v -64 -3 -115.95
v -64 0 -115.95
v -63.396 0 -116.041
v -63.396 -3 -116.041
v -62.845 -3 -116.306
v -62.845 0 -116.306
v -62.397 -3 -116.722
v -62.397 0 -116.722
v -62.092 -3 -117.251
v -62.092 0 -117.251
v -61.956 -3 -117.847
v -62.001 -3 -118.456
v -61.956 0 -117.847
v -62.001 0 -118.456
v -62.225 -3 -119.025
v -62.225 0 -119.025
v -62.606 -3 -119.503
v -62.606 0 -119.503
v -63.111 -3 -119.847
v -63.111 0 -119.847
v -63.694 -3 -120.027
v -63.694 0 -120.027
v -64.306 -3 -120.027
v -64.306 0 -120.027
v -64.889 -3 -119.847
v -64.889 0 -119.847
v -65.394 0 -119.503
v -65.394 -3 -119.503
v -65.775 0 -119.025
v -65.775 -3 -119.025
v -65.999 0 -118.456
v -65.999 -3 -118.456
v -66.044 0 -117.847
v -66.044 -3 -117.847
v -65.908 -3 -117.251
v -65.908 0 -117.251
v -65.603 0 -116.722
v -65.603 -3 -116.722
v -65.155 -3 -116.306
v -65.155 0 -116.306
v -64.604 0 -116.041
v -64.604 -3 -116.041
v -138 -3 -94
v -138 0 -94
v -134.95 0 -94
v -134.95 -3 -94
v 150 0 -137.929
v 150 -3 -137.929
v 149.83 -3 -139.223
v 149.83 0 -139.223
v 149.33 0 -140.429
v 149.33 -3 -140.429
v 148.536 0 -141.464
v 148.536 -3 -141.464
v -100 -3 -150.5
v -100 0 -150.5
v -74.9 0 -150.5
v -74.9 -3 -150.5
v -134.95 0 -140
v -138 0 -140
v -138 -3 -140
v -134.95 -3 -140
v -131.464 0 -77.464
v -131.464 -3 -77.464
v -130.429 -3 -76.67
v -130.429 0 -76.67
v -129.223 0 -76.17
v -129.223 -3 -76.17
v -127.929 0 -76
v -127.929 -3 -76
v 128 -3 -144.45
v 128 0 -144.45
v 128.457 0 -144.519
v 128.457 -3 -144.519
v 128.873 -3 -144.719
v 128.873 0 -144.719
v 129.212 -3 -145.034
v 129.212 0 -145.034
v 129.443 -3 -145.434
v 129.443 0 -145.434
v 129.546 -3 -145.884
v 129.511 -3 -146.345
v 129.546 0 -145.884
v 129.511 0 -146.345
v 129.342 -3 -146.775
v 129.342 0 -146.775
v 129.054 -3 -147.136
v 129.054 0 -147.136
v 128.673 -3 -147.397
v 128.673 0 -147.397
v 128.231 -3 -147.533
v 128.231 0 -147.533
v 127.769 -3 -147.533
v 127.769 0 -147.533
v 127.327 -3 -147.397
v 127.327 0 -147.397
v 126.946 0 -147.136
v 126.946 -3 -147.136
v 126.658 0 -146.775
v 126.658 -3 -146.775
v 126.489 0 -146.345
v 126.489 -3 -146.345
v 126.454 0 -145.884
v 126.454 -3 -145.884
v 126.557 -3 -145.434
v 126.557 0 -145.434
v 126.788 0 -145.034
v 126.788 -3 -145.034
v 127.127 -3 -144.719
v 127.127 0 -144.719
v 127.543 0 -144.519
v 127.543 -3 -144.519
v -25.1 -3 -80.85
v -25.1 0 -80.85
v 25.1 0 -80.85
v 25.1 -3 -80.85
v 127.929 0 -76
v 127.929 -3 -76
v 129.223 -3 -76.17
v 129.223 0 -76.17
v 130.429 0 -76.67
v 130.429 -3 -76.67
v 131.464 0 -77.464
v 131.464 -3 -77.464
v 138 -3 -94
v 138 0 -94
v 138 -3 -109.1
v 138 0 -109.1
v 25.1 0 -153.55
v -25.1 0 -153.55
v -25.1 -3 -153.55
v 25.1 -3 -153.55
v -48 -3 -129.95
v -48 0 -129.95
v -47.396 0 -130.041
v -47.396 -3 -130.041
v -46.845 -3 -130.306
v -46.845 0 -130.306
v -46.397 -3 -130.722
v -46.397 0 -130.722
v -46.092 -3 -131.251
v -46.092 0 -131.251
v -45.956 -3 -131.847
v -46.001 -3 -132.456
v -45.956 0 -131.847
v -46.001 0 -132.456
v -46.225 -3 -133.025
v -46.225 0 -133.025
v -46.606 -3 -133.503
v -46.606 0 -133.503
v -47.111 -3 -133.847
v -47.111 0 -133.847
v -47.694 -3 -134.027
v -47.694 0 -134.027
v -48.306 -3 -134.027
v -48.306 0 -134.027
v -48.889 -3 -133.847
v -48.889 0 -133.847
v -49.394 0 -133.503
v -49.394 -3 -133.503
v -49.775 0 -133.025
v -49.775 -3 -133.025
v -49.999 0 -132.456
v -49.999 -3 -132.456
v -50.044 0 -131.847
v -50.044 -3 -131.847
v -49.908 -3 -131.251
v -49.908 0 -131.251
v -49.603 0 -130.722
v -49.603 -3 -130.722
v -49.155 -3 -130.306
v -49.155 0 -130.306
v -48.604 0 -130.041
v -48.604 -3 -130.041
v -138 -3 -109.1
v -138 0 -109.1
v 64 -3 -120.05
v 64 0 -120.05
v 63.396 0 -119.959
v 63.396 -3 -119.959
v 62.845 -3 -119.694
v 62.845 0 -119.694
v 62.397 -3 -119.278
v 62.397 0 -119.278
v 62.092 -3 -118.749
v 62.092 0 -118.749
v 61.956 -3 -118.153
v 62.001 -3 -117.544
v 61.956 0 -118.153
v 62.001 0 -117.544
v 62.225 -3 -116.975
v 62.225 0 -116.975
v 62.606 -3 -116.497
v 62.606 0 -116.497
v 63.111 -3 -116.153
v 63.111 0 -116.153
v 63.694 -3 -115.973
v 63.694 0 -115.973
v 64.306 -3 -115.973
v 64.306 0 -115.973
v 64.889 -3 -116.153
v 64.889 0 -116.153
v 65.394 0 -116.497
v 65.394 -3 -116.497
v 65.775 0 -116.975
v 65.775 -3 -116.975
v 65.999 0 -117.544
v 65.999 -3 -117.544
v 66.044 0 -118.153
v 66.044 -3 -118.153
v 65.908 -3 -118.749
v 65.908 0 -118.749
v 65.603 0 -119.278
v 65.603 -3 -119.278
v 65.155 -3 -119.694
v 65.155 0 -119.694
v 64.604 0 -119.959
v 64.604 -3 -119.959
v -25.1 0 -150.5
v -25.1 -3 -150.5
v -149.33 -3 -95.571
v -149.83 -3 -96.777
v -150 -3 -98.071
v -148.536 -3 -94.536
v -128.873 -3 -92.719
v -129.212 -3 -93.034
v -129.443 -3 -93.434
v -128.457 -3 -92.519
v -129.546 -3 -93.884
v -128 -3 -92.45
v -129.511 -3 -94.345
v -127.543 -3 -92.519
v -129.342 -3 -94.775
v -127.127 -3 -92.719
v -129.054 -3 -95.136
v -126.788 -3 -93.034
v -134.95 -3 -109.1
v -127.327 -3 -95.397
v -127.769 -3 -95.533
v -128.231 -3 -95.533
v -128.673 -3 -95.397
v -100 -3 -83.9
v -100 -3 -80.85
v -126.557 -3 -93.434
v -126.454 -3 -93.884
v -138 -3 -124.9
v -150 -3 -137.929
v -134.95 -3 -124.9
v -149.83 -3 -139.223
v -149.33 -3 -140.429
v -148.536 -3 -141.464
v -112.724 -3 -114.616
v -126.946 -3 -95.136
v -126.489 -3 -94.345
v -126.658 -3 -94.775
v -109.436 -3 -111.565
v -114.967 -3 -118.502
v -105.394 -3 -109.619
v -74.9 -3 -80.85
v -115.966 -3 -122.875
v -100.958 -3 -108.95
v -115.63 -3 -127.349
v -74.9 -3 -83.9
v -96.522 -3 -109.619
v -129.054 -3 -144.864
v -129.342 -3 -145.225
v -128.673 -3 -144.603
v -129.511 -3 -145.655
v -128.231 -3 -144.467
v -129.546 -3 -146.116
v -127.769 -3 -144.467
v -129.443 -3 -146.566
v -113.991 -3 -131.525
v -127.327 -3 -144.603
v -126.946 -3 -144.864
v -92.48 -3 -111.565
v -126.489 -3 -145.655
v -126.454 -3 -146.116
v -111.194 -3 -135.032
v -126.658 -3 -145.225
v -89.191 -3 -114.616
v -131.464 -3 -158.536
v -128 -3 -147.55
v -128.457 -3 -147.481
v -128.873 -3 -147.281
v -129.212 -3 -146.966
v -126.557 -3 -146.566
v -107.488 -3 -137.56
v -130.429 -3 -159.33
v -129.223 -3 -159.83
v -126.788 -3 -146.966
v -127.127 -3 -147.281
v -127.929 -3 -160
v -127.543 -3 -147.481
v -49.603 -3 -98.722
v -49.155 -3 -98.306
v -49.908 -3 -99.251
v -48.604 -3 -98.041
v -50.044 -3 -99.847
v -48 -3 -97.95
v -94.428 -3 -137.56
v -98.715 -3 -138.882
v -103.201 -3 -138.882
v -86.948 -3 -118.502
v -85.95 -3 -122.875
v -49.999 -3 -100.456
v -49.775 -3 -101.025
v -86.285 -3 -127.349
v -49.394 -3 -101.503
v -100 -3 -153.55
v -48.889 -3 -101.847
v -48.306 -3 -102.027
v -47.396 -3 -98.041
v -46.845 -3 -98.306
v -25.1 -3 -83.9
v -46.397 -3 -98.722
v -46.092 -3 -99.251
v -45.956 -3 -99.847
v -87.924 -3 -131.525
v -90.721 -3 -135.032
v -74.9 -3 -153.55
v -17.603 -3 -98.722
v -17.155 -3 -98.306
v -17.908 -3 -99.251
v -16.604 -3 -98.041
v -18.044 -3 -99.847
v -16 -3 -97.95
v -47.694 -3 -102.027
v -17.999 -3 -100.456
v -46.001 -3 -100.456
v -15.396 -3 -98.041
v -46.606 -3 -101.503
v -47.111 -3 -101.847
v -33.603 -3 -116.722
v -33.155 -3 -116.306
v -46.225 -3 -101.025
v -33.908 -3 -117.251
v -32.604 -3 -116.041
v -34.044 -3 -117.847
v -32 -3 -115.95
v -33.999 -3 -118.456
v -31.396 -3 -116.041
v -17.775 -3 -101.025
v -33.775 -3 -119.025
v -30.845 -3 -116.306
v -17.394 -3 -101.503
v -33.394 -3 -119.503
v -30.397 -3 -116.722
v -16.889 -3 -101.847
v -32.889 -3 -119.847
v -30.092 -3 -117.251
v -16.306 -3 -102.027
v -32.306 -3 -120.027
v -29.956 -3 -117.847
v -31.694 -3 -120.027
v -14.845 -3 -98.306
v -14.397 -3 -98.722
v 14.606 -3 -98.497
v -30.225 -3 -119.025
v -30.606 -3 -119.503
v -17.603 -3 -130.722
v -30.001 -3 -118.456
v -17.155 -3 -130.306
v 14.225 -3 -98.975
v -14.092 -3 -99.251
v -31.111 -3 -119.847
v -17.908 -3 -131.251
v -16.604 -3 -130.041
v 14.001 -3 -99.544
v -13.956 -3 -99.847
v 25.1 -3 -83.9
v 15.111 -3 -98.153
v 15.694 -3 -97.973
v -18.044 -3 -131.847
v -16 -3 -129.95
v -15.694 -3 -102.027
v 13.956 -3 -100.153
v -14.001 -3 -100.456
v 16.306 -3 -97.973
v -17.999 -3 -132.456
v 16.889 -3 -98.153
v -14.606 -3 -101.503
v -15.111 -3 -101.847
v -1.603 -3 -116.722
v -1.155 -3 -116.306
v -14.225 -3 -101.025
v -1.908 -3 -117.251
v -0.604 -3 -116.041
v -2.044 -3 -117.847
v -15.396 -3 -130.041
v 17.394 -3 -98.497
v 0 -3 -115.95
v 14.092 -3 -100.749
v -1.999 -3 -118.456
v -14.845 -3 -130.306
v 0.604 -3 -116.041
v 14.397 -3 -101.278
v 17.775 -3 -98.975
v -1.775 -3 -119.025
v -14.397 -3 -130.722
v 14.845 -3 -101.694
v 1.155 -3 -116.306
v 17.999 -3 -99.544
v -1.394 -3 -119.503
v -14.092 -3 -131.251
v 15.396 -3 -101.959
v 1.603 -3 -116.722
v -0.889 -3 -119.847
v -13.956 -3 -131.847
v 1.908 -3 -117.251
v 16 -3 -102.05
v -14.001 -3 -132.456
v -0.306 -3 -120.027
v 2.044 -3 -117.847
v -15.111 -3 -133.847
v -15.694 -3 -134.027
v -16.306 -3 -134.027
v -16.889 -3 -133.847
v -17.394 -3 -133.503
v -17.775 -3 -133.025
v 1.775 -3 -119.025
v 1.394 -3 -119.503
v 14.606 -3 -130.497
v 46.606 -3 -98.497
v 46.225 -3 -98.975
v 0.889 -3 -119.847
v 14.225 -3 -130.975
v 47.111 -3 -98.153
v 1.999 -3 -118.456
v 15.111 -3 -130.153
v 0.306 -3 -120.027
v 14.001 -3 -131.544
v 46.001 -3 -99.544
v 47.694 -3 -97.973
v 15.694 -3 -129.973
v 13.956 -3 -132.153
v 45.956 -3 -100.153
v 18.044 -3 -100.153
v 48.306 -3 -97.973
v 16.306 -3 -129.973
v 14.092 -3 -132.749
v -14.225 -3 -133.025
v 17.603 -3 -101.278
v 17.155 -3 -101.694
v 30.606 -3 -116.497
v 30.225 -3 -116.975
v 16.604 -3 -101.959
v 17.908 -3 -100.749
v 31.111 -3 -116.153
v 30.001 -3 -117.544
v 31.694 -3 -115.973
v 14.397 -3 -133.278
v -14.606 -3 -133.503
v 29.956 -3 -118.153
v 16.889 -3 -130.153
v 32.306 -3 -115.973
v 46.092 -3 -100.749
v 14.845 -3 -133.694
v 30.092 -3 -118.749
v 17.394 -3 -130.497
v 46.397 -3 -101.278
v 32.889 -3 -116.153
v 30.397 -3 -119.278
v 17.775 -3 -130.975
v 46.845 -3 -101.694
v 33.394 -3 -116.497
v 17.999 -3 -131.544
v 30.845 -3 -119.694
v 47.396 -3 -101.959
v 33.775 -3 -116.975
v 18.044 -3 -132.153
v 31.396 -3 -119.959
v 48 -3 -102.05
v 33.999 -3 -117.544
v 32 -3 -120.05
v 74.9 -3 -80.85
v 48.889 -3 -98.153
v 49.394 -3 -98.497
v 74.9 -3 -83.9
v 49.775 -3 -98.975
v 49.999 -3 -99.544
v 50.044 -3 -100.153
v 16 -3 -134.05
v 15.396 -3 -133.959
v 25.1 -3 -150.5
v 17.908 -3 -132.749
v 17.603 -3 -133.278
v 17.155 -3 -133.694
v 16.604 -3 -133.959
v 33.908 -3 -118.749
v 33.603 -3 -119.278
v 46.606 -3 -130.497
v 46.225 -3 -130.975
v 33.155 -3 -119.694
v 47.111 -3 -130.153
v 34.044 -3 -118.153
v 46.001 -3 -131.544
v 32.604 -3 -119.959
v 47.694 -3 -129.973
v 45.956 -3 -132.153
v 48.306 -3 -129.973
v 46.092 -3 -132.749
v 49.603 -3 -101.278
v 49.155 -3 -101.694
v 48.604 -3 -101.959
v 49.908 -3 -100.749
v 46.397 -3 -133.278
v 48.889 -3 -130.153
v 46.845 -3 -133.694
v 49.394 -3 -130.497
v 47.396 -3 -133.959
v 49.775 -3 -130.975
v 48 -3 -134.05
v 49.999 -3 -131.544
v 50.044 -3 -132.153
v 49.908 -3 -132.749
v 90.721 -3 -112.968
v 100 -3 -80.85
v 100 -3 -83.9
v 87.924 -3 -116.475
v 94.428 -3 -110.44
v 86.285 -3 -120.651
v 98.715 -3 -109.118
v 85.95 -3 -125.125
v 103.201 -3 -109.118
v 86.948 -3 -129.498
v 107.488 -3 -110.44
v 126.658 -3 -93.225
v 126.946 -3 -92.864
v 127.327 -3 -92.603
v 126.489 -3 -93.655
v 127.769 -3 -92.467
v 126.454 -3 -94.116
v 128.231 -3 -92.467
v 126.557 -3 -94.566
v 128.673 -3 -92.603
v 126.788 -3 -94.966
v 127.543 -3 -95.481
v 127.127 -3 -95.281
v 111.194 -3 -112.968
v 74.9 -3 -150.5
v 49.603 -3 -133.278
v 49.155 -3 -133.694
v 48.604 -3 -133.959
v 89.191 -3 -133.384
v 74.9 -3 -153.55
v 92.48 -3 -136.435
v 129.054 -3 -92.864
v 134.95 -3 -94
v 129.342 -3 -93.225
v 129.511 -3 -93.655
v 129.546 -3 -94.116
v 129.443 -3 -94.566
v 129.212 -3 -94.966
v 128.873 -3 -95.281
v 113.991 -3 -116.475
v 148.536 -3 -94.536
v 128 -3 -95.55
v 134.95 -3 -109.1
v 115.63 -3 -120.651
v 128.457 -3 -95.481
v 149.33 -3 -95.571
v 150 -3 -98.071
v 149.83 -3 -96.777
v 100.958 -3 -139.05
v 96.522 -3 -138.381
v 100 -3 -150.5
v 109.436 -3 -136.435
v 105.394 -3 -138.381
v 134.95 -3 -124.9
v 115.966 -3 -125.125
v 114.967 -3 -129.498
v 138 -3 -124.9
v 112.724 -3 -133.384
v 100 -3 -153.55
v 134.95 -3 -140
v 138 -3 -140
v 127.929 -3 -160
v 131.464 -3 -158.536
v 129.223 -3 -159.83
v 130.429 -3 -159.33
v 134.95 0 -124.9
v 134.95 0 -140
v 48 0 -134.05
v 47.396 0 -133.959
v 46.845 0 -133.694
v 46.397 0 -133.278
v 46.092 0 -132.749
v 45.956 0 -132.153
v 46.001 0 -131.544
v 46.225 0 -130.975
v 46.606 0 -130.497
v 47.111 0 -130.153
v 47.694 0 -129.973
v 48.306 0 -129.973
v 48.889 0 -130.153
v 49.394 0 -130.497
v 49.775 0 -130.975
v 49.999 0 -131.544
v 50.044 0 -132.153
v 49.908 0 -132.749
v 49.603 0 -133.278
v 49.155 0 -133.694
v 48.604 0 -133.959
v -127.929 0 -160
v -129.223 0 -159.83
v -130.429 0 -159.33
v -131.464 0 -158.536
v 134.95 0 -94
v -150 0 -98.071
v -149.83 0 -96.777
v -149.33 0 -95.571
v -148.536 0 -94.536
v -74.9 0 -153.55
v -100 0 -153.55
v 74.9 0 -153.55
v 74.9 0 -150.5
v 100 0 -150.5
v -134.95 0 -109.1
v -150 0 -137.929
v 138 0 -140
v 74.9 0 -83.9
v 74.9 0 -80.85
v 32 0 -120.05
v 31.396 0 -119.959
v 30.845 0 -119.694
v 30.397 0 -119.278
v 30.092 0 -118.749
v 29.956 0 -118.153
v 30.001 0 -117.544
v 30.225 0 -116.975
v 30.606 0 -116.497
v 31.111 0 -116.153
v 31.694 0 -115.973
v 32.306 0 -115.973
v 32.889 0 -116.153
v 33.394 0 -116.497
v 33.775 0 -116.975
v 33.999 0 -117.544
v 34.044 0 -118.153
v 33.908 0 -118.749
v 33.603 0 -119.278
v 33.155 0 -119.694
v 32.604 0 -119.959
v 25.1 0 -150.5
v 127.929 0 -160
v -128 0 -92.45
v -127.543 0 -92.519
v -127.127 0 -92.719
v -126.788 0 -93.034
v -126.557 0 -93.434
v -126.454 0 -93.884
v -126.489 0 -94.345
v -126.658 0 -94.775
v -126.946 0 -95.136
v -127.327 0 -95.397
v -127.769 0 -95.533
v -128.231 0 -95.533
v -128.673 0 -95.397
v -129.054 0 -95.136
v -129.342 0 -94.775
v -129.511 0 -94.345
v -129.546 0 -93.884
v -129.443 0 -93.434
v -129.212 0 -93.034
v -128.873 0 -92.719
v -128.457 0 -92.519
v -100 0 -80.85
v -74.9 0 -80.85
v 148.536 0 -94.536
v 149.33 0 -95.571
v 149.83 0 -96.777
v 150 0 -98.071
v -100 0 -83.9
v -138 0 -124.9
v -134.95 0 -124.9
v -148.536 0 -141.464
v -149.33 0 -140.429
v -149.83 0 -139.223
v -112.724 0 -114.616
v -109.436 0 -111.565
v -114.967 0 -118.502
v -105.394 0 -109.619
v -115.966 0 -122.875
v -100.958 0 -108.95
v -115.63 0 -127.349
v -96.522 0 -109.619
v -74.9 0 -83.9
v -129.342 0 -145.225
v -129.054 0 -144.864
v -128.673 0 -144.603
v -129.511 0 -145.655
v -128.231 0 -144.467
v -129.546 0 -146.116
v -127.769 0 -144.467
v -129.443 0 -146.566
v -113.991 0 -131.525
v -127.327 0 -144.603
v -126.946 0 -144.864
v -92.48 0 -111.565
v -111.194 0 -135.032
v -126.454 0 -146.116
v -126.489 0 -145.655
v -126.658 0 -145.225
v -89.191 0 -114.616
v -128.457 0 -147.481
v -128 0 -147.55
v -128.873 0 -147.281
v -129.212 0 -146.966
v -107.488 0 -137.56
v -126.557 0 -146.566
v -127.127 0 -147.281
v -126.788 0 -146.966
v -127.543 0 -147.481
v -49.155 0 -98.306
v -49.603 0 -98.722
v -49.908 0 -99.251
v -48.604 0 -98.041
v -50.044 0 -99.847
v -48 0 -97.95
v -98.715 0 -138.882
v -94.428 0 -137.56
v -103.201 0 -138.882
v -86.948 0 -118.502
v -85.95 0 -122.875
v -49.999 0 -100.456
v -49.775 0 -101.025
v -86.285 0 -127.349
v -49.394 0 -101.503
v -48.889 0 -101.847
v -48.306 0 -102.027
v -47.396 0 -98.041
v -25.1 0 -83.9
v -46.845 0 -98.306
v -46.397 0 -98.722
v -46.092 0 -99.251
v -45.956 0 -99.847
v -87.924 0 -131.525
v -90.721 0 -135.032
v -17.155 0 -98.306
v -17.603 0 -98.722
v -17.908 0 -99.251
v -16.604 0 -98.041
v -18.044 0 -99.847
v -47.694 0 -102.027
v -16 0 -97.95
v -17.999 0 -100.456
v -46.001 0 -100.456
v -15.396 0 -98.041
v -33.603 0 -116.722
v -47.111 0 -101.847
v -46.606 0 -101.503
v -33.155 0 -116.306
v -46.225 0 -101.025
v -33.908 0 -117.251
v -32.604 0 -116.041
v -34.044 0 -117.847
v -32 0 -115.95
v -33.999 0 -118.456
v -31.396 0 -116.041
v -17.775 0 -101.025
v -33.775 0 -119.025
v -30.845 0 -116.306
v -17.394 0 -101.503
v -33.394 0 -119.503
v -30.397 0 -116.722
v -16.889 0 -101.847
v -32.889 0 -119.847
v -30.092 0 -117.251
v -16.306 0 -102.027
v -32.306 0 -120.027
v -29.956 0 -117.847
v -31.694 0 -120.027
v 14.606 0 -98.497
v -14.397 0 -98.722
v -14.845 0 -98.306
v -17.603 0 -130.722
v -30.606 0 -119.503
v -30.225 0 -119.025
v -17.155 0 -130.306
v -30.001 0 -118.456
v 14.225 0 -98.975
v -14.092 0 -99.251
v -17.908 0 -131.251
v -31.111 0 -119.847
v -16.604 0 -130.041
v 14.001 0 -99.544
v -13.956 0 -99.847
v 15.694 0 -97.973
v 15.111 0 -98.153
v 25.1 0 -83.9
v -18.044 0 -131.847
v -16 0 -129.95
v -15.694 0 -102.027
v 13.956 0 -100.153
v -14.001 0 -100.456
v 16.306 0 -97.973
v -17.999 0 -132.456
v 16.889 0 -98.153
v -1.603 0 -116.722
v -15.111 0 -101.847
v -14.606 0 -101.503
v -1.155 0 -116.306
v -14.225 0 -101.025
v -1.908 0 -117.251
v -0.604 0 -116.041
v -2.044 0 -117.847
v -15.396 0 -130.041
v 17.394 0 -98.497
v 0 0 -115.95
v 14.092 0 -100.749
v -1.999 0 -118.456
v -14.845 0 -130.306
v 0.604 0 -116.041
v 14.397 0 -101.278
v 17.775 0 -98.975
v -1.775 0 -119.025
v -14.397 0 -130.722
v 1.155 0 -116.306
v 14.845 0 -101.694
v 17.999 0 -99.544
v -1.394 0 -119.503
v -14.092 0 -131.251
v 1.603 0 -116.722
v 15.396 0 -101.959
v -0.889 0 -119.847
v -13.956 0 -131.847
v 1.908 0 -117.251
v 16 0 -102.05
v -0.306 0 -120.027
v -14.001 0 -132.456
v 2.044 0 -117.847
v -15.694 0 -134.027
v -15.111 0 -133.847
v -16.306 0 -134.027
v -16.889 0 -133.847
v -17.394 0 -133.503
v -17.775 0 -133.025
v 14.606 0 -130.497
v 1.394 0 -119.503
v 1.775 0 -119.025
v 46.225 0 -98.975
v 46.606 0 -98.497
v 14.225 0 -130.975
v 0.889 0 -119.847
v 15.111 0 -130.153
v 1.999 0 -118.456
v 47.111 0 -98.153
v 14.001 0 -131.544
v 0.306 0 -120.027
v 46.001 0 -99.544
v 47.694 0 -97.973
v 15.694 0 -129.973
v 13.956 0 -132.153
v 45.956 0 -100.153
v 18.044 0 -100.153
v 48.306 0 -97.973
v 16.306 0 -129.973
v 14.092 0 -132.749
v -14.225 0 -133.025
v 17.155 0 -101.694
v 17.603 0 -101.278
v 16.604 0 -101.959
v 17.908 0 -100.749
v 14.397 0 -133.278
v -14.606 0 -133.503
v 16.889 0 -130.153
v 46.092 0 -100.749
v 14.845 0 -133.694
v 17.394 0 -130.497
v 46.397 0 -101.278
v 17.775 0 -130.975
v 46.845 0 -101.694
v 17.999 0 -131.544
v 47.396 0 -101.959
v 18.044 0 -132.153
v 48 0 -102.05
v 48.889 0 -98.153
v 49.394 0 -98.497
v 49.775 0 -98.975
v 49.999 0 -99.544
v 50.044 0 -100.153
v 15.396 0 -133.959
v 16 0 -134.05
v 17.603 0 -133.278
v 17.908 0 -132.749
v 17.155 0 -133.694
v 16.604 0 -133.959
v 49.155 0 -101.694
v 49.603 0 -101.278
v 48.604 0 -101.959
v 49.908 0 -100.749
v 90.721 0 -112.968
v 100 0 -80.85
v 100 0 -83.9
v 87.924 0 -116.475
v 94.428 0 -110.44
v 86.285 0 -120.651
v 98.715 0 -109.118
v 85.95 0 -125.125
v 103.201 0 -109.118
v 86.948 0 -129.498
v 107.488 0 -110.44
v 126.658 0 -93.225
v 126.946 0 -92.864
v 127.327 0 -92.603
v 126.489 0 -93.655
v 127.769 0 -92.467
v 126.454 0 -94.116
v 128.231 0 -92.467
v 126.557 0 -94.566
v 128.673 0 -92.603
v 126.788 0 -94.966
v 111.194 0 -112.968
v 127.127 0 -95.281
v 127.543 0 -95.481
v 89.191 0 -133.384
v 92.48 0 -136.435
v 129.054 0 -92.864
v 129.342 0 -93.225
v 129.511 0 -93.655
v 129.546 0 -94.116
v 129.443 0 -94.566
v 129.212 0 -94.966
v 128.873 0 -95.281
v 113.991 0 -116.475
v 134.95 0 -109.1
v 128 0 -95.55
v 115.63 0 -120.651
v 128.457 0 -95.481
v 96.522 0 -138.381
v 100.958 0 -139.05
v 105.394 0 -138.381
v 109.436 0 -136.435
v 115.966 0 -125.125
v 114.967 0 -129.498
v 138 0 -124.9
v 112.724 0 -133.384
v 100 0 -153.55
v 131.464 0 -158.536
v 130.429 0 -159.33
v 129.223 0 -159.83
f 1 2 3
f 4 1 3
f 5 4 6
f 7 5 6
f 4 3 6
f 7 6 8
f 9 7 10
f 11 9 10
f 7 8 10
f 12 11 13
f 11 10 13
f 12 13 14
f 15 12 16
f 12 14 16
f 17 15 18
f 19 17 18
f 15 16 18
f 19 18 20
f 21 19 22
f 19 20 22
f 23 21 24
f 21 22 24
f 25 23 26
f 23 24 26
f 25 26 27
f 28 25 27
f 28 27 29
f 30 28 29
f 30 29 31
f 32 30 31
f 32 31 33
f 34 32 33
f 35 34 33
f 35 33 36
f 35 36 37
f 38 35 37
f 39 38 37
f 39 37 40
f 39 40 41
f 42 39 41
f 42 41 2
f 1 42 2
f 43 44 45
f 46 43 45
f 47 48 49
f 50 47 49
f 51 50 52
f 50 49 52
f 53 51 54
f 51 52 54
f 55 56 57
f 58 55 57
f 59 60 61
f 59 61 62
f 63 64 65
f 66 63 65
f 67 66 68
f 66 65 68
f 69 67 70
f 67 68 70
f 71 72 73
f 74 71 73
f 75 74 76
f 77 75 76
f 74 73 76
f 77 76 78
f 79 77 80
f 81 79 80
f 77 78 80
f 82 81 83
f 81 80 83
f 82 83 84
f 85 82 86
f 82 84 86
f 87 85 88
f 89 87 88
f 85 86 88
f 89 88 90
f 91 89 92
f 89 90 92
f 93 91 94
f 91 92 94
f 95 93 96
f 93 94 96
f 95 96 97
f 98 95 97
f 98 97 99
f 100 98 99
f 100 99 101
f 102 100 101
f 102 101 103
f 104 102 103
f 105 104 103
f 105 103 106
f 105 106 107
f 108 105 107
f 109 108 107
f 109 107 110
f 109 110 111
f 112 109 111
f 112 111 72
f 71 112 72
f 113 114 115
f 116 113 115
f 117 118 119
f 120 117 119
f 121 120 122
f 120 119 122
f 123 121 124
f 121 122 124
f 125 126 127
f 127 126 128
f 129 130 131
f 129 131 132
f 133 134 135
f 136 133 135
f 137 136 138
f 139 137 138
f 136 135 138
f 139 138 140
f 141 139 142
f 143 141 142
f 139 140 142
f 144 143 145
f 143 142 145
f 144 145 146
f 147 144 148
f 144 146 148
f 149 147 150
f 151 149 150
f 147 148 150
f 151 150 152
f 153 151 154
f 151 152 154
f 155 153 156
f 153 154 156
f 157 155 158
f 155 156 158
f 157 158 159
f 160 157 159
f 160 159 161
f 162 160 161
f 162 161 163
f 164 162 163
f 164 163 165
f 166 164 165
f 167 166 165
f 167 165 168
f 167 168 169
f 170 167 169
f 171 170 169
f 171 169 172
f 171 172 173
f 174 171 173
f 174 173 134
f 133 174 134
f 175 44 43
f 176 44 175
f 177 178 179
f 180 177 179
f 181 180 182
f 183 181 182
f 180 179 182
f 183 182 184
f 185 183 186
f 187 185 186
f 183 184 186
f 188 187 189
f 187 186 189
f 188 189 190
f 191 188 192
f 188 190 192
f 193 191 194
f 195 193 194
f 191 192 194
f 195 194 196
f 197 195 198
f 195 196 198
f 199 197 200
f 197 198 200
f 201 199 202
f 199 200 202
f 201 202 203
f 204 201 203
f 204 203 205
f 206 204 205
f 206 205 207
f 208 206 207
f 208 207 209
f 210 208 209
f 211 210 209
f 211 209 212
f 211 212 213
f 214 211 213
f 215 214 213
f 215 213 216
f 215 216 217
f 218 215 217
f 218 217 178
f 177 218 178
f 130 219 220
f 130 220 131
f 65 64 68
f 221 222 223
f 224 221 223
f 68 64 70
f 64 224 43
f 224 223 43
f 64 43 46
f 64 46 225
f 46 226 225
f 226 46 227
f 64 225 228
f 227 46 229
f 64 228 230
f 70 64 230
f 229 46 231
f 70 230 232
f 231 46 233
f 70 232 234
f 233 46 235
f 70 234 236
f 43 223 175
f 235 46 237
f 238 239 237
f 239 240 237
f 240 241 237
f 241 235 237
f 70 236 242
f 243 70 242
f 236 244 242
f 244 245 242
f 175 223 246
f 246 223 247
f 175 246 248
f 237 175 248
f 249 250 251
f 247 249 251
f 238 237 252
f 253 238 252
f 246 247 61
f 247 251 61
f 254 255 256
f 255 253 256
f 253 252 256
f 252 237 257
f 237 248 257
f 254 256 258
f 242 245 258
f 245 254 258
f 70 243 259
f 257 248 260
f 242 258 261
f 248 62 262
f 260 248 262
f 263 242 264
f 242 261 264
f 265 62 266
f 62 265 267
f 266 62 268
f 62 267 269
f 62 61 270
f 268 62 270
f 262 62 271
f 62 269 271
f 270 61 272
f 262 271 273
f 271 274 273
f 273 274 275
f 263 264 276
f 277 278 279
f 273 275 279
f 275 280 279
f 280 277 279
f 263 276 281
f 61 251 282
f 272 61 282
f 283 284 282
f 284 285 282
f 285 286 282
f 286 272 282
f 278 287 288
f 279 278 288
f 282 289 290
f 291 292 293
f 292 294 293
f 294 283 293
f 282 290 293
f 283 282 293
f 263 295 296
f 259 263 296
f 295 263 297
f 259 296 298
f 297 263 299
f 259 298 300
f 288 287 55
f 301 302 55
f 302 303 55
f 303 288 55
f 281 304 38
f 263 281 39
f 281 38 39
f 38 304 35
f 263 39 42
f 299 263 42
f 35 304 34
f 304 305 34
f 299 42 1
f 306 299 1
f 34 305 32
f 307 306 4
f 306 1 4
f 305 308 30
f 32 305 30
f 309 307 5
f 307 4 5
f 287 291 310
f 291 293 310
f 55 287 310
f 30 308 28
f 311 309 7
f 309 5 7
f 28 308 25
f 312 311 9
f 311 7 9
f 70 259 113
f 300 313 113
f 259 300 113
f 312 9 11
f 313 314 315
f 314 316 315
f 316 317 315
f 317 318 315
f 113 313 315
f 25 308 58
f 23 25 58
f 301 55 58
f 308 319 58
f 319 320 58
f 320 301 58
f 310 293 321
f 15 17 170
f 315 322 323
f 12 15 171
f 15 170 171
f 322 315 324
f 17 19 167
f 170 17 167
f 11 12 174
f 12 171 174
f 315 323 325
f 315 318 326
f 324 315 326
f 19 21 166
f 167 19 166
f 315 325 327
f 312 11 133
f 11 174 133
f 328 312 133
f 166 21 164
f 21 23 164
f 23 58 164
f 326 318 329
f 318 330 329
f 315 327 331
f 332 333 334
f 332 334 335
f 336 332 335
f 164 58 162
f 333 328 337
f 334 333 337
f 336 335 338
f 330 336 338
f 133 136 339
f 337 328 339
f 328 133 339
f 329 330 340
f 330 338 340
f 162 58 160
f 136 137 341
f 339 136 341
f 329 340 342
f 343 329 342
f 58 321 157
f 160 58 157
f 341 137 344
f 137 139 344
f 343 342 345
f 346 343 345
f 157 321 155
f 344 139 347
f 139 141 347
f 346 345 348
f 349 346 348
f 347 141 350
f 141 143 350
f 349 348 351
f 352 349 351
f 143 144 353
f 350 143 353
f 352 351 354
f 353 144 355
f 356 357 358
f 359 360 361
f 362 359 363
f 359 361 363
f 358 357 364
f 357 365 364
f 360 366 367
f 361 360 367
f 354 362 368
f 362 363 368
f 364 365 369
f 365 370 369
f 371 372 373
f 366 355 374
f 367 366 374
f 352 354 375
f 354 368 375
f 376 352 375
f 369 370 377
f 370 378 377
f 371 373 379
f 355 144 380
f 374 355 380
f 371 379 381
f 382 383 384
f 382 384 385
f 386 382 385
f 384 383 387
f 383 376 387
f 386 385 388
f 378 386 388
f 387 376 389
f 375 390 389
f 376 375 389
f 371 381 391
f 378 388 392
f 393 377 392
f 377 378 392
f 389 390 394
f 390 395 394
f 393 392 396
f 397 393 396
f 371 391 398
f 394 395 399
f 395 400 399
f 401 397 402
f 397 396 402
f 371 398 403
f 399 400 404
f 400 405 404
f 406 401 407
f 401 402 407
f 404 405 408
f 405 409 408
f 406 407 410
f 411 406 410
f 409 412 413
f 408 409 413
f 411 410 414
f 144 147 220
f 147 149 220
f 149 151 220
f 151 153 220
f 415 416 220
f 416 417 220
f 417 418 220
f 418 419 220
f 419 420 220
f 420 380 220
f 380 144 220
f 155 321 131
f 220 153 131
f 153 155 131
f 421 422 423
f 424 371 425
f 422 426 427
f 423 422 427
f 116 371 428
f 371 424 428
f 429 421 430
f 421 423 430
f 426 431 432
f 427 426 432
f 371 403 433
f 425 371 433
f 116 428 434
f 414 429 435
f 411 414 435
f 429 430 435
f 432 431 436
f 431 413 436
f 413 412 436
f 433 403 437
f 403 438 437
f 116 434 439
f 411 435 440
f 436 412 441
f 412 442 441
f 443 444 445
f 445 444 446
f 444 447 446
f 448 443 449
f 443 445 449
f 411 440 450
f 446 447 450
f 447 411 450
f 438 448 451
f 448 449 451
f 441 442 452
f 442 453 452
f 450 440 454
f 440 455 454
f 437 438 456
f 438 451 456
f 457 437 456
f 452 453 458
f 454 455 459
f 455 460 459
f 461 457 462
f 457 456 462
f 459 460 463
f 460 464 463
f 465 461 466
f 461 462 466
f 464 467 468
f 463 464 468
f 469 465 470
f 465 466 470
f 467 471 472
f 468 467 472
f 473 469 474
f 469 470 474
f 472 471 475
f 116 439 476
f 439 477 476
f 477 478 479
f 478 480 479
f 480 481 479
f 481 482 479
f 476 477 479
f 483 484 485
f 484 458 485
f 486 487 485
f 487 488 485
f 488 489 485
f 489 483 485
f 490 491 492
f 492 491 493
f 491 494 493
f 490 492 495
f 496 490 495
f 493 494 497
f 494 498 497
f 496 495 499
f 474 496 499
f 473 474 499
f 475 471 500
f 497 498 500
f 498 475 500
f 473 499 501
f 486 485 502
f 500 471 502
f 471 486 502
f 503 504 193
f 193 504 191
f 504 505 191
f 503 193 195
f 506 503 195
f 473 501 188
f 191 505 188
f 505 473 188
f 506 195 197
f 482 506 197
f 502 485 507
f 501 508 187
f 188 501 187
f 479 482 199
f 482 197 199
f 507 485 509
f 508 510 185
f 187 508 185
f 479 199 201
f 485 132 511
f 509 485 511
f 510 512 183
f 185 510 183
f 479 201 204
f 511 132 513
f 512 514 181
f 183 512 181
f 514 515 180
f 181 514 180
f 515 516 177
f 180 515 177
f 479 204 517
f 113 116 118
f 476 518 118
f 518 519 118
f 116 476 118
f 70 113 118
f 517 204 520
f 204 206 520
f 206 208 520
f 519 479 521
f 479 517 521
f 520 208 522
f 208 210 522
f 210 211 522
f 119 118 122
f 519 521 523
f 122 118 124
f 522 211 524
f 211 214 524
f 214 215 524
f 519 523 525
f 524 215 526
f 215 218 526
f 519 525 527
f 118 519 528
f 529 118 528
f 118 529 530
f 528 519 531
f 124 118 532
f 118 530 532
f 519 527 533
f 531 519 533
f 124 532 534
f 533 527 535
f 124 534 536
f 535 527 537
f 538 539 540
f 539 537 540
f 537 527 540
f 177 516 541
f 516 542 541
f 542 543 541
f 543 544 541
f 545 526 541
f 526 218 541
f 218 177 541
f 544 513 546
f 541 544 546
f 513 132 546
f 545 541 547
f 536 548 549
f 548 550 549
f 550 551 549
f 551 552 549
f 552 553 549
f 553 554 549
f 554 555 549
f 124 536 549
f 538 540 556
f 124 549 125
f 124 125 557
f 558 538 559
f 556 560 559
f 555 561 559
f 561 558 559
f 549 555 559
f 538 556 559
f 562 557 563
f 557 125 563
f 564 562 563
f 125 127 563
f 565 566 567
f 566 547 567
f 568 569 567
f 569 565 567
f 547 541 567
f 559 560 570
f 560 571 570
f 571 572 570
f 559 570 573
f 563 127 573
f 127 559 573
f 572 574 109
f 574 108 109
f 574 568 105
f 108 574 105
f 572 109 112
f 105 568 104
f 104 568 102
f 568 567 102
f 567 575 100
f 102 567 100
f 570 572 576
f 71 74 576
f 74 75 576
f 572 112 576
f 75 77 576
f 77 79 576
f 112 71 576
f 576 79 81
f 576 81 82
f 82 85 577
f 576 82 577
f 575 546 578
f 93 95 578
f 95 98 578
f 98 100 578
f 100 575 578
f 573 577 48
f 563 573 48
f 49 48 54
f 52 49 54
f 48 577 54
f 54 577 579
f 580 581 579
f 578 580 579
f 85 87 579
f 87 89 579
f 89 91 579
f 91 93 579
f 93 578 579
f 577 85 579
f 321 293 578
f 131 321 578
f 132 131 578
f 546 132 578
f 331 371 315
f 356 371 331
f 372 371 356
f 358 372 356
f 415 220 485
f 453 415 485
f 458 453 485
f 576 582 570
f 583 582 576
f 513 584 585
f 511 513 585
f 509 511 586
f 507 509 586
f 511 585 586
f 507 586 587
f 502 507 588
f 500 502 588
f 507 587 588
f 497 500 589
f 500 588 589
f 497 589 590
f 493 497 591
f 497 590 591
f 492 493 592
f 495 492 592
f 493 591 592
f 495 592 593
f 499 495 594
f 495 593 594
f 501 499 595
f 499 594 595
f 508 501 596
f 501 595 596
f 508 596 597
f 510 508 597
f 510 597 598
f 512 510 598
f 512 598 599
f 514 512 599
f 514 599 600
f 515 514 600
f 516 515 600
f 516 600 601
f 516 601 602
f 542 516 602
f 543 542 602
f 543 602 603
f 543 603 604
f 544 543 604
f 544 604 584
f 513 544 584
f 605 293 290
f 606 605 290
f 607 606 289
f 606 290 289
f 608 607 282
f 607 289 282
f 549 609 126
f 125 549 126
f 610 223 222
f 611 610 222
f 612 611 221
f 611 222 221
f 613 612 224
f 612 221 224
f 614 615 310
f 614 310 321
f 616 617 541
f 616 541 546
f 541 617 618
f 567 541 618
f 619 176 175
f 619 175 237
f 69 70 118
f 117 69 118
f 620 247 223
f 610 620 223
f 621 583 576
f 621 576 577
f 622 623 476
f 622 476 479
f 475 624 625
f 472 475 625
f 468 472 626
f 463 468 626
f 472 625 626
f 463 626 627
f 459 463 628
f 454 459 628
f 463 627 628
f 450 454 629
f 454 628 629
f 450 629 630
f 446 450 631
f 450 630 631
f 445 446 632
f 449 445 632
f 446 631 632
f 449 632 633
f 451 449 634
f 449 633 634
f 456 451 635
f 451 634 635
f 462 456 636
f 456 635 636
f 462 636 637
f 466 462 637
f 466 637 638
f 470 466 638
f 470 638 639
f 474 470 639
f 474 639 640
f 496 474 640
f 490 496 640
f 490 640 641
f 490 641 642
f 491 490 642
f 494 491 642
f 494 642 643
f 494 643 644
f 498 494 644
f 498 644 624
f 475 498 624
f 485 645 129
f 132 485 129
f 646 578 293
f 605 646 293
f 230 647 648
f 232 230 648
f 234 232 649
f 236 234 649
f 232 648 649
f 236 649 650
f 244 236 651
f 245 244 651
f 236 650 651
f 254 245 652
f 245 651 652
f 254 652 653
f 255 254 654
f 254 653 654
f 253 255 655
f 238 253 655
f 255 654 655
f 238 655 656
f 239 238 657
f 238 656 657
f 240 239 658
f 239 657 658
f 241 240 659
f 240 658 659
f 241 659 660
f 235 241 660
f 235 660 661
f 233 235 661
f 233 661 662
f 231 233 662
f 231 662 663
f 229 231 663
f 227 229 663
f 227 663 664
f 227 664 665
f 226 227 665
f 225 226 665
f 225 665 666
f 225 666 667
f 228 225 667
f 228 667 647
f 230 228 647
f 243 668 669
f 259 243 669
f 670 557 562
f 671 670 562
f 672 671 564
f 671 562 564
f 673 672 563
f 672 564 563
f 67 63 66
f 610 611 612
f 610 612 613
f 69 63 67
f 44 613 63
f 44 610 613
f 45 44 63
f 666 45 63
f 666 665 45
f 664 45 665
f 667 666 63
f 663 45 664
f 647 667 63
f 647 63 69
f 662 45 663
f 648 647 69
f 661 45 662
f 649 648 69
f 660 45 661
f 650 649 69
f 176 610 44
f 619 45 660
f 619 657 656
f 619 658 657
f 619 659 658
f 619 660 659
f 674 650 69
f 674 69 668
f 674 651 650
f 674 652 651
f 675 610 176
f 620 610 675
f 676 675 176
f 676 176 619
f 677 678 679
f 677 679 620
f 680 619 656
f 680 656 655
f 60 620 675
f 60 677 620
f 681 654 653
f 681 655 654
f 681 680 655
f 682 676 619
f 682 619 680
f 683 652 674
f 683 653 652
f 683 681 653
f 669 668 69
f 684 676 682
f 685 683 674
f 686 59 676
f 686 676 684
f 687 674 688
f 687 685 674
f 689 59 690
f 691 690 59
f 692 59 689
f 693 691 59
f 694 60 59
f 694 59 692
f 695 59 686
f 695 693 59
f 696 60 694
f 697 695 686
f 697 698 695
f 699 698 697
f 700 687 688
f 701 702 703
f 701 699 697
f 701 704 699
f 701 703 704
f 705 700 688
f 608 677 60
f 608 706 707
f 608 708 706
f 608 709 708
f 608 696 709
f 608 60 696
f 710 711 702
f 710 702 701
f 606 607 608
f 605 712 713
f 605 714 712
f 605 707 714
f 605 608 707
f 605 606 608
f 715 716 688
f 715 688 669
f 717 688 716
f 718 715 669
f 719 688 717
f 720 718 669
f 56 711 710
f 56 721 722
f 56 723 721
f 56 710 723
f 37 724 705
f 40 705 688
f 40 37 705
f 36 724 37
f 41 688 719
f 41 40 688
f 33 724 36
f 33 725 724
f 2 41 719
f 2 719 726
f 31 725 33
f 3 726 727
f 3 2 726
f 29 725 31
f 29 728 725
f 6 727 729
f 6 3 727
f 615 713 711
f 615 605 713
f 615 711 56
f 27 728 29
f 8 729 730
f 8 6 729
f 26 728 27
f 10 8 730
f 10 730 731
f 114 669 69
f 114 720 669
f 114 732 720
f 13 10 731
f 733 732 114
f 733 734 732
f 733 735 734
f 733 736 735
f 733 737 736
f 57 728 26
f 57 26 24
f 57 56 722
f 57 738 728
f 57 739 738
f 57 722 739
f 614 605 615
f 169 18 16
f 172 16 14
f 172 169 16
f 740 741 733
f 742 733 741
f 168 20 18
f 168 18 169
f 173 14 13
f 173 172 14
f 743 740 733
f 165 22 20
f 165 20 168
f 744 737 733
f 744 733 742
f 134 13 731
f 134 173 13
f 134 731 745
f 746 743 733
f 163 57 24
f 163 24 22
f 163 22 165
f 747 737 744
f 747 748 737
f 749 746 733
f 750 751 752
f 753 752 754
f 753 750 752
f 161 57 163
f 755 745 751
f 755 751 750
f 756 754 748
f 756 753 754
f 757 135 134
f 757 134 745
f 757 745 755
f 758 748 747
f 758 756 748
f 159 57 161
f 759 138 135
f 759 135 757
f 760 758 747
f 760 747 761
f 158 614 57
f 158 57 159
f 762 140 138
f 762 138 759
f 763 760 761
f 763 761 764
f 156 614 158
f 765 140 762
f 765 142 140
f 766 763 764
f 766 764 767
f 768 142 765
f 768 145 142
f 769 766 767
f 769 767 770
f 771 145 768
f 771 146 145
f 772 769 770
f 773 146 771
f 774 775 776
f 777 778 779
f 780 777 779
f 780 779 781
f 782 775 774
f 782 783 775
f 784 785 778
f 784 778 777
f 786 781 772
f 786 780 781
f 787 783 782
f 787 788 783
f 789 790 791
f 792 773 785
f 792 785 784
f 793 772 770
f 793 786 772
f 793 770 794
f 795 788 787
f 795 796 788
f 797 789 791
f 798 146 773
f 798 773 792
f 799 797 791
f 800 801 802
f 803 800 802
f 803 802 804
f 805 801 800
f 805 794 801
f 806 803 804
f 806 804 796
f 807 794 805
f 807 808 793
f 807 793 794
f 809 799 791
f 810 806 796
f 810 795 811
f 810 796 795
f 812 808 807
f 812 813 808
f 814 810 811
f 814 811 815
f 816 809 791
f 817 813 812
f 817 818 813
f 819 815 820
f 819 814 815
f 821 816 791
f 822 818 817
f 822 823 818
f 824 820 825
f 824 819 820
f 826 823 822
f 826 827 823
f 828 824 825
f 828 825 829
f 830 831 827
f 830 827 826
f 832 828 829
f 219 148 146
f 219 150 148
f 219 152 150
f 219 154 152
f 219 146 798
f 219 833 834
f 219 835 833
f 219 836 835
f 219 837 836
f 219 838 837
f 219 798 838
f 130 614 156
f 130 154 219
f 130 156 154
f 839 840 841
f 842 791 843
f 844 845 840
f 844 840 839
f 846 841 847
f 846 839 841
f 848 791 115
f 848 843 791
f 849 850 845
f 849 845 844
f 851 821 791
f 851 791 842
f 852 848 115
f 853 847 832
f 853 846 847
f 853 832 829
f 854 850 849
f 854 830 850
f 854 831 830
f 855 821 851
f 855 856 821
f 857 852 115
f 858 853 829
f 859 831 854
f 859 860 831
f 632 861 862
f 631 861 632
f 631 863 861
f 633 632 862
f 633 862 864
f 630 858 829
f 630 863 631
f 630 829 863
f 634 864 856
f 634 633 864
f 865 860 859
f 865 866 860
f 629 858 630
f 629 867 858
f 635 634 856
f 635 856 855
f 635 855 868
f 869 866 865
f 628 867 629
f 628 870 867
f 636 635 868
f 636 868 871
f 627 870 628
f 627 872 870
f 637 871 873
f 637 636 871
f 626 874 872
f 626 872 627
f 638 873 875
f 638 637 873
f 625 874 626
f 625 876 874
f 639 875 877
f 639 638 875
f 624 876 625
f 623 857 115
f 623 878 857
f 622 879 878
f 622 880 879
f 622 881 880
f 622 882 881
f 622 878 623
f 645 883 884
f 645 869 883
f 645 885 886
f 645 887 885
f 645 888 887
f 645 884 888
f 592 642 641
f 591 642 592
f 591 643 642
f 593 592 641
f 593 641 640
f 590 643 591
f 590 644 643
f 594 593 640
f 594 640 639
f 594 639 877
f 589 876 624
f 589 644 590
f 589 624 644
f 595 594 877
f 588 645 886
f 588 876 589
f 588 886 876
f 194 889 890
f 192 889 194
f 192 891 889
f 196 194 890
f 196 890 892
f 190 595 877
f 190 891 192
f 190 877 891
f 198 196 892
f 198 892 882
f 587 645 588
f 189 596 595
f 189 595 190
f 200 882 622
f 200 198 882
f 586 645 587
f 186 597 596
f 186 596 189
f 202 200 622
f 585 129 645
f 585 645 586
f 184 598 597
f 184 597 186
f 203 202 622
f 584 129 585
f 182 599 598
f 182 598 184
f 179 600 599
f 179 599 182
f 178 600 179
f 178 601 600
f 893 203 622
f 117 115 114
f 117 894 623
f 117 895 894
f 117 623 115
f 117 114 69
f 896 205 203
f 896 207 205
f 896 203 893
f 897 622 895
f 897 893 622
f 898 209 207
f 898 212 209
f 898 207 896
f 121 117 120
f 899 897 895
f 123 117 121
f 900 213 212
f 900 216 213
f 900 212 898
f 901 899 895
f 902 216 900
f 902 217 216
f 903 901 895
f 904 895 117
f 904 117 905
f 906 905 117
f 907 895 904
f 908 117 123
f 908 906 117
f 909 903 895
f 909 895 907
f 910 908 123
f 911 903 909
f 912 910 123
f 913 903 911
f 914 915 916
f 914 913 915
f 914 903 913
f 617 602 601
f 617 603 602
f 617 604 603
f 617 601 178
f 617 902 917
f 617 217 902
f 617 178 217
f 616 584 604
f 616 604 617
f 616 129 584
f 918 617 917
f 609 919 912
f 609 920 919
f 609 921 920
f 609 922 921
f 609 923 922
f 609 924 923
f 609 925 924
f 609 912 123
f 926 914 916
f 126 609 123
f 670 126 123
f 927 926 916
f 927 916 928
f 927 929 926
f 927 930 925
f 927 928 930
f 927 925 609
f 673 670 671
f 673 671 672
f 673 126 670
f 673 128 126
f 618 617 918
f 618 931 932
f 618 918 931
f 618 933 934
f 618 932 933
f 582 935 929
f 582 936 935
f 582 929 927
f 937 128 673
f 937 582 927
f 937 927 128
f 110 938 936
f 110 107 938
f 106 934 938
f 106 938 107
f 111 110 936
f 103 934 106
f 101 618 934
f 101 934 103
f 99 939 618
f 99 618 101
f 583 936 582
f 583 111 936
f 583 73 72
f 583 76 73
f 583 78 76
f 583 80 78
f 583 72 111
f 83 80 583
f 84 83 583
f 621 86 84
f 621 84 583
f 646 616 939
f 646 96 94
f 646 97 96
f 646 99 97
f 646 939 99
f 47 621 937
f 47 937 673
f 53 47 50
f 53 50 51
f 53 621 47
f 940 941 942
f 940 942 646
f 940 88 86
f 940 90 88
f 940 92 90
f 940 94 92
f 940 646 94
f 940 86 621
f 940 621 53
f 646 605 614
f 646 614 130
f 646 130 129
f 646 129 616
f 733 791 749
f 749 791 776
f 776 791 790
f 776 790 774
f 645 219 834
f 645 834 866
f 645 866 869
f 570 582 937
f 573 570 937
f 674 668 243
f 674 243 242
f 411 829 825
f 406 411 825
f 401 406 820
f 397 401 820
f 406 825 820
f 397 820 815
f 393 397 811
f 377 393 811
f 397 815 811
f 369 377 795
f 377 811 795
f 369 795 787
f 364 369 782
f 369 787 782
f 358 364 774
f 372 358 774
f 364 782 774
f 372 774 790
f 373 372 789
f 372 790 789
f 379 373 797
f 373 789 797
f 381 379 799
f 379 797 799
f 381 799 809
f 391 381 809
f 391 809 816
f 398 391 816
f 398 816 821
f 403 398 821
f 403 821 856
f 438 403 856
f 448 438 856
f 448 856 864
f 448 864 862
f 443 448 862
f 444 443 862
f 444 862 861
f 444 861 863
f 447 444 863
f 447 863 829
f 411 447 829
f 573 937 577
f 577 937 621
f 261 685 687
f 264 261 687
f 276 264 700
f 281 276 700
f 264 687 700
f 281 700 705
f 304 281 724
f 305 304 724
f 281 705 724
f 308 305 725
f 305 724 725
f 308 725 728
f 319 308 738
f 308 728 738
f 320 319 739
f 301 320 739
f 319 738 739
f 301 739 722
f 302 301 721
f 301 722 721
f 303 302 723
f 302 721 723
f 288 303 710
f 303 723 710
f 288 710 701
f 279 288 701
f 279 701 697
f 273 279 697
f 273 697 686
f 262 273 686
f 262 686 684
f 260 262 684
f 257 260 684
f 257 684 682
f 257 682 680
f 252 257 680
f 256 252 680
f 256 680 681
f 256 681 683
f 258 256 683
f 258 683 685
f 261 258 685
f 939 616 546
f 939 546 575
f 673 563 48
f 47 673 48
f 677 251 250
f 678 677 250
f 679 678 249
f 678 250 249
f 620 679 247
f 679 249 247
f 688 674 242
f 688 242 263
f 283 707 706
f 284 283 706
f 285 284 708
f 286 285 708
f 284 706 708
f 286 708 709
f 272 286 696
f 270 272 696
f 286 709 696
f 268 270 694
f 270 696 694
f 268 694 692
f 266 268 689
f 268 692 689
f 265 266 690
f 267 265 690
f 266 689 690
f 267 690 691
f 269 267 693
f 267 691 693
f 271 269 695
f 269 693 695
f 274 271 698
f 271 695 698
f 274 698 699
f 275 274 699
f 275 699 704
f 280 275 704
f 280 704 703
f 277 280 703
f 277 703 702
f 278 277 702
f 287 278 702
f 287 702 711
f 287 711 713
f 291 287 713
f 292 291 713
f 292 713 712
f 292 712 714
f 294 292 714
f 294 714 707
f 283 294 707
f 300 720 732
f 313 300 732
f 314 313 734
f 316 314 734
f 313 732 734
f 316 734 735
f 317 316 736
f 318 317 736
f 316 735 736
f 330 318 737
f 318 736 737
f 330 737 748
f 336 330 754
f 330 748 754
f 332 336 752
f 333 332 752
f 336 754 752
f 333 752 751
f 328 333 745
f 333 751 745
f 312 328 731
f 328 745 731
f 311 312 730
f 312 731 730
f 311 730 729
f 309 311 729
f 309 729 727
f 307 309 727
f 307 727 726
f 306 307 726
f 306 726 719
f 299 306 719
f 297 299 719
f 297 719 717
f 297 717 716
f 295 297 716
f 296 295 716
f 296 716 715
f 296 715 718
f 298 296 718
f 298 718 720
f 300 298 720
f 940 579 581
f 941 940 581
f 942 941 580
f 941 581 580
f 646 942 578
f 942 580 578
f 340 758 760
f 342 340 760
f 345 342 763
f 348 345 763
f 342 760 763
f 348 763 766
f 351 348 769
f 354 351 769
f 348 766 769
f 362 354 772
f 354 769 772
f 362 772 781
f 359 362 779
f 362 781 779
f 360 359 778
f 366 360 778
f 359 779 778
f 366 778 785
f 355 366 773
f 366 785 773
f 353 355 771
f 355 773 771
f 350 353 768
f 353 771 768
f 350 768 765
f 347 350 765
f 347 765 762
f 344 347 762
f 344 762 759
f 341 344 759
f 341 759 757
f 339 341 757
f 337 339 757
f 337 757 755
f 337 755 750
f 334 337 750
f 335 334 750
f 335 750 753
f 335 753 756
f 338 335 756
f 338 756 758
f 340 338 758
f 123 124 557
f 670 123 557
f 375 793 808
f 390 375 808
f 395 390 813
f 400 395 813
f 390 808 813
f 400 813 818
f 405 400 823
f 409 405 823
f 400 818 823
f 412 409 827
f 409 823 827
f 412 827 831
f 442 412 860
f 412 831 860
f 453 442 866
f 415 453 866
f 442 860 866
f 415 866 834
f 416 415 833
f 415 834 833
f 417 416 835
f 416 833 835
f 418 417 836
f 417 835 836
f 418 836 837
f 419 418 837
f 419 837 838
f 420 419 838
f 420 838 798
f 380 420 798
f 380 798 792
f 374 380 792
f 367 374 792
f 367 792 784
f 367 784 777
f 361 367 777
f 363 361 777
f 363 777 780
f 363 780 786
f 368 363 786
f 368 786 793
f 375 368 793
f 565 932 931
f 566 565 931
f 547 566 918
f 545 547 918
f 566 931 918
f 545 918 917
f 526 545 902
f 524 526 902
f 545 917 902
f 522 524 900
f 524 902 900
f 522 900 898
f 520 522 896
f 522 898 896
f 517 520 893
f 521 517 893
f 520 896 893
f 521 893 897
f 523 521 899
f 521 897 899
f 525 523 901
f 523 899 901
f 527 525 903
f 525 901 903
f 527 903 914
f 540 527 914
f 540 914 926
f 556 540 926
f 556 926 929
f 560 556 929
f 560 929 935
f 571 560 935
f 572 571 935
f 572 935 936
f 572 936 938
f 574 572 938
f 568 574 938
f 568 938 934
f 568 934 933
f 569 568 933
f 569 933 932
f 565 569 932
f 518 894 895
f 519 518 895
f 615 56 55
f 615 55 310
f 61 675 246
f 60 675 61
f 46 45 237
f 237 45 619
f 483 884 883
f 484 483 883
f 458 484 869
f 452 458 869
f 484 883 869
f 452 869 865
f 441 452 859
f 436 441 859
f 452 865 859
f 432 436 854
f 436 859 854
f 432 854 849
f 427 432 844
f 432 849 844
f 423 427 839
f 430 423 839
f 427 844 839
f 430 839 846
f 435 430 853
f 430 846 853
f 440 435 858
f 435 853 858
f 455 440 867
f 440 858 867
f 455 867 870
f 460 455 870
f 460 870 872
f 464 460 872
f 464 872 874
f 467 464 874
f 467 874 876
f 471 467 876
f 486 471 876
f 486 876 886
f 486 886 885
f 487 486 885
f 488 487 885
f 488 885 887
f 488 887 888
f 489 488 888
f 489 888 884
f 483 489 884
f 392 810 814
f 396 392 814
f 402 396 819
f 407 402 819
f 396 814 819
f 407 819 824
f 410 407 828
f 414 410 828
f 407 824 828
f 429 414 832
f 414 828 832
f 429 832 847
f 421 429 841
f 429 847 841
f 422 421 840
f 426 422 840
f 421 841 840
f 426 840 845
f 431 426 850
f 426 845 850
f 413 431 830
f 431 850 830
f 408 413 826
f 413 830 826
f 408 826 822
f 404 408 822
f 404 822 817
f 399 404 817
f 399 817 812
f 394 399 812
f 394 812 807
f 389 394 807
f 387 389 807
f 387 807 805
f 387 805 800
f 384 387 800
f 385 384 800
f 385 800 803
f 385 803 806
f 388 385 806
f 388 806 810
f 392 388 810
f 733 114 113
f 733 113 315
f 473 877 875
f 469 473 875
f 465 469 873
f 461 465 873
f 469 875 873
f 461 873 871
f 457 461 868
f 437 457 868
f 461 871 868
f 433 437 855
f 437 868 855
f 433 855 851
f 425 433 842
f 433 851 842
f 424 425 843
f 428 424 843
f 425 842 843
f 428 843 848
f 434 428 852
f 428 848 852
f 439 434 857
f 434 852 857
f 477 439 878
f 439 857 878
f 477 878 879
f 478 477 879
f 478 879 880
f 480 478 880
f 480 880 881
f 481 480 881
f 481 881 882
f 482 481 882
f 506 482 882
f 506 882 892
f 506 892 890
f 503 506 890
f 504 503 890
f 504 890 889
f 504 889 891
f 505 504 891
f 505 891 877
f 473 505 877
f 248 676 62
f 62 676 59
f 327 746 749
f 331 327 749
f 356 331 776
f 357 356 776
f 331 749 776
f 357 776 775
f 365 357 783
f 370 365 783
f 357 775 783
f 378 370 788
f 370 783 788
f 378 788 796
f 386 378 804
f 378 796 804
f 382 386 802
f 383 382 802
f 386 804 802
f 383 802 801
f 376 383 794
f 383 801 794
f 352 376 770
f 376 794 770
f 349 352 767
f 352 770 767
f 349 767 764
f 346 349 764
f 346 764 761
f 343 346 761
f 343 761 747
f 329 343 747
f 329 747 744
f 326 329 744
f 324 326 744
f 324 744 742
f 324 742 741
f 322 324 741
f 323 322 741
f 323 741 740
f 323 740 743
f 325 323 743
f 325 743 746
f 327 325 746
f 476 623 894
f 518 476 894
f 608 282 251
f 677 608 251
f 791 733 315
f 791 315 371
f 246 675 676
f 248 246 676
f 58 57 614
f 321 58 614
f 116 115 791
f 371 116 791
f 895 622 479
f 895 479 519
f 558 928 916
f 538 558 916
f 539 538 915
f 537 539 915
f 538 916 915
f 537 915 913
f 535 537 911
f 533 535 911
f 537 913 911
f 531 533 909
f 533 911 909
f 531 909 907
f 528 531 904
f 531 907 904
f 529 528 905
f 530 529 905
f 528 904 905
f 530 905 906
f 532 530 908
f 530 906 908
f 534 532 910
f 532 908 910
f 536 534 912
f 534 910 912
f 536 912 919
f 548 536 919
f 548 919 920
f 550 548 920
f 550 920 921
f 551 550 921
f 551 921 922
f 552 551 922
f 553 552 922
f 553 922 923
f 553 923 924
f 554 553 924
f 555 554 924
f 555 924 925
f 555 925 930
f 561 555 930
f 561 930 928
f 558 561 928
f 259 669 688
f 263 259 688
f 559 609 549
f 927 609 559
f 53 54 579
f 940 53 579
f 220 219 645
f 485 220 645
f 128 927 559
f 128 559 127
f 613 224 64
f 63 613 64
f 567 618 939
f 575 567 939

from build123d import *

# Parameters (mm, degrees)
BASE_FLANGE1_START = -3
BASE_FLANGE1_DEPTH = 3
SKETCH6_R          = 1.55
CUT_EXTRUDE1_DEPTH = 10
SKETCH7_R          = 1.55
CUT_EXTRUDE2_DEPTH = 10
SKETCH8_W          = 50.2
SKETCH8_H          = 3.05
SKETCH8_W_2        = 25.1
SKETCH8_W_3        = 3.05
SKETCH8_H_2        = 15.1
CUT_EXTRUDE5_DEPTH = 10
SKETCH12_R         = 15.05
SKETCH12_R_2       = 2.05
CUT_EXTRUDE6_DEPTH = 10


# Read off the part's stored shape, not the designer's step: Base-Flange1
with BuildPart() as part:
    # Base-Flange1 outline → Base-Flange1 (new body)
    with BuildSketch(Plane(origin=(0, 0, 0), x_dir=(1, 0, 0), z_dir=(0, 1, 0)).offset(BASE_FLANGE1_START)):
        with BuildLine():
            Line((-127.928932188, 76), (127.928932188, 76))
            ThreePointArc((127.928932188, 76), (129.84234935, 76.380602337), (131.464466094, 77.464466094))
            Line((131.464466094, 77.464466094), (148.535533906, 94.535533906))
            ThreePointArc((148.535533906, 94.535533906), (149.619397663, 96.15765065), (150, 98.071067812))
            Line((150, 98.071067812), (150, 137.928932188))
            ThreePointArc((150, 137.928932188), (149.619397663, 139.84234935), (148.535533906, 141.464466094))
            Line((148.535533906, 141.464466094), (131.464466094, 158.535533906))
            ThreePointArc((131.464466094, 158.535533906), (129.84234935, 159.619397663), (127.928932188, 160))
            Line((127.928932188, 160), (-127.928932188, 160))
            ThreePointArc((-127.928932188, 160), (-129.84234935, 159.619397663), (-131.464466094, 158.535533906))
            Line((-131.464466094, 158.535533906), (-148.535533906, 141.464466094))
            ThreePointArc((-148.535533906, 141.464466094), (-149.619397663, 139.84234935), (-150, 137.928932188))
            Line((-150, 137.928932188), (-150, 98.071067812))
            ThreePointArc((-150, 98.071067812), (-149.619397663, 96.15765065), (-148.535533906, 94.535533906))
            Line((-148.535533906, 94.535533906), (-131.464466094, 77.464466094))
            ThreePointArc((-131.464466094, 77.464466094), (-129.84234935, 76.380602337), (-127.928932188, 76))
        make_face()
    extrude(amount=BASE_FLANGE1_DEPTH)

    # Sketch6 → Cut-Extrude1 (cut)
    with BuildSketch(Plane(origin=(0, 0, 0), x_dir=(1, 0, 0), z_dir=(0, 1, 0))):
        with Locations(Location((128, 146, 0), (0, 0, 270))):
            Circle(SKETCH6_R)
        with Locations(Location((-128, 146, 0), (0, 0, 90))):
            Circle(SKETCH6_R)
    extrude(amount=-CUT_EXTRUDE1_DEPTH, mode=Mode.SUBTRACT)

    # Sketch7 → Cut-Extrude2 (cut)
    with BuildSketch(Plane(origin=(0, 0, 0), x_dir=(1, 0, 0), z_dir=(0, 1, 0))):
        with Locations(Location((-128, 94, 0), (0, 0, 270))):
            Circle(SKETCH7_R)
        with Locations(Location((128, 94, 0), (0, 0, 90))):
            Circle(SKETCH7_R)
    extrude(amount=-CUT_EXTRUDE2_DEPTH, mode=Mode.SUBTRACT)

    # Sketch8 → Cut-Extrude5 (cut)
    with BuildSketch(Plane(origin=(0, 0, 0), x_dir=(1, 0, 0), z_dir=(0, 1, 0))):
        with Locations((0, 82.375)):
            Rectangle(SKETCH8_W, SKETCH8_H)
        with Locations((87.45, 82.375)):
            Rectangle(SKETCH8_W_2, SKETCH8_H)
        with Locations((136.475, 132.45)):
            Rectangle(SKETCH8_W_3, SKETCH8_H_2)
        with Locations((0, 152.025)):
            Rectangle(SKETCH8_W, SKETCH8_H)
        with Locations((87.45, 152.025)):
            Rectangle(SKETCH8_W_2, SKETCH8_H)
        with Locations((-87.45, 152.025)):
            Rectangle(SKETCH8_W_2, SKETCH8_H)
        with Locations((136.475, 101.55)):
            Rectangle(SKETCH8_W_3, SKETCH8_H_2)
        with Locations((-87.45, 82.375)):
            Rectangle(SKETCH8_W_2, SKETCH8_H)
        with Locations((-136.475, 101.55)):
            Rectangle(SKETCH8_W_3, SKETCH8_H_2)
        with Locations((-136.475, 132.45)):
            Rectangle(SKETCH8_W_3, SKETCH8_H_2)
    extrude(amount=-CUT_EXTRUDE5_DEPTH, mode=Mode.SUBTRACT)

    # Sketch12 → Cut-Extrude6 (cut)
    with BuildSketch(Plane(origin=(0, 0, 0), x_dir=(1, 0, 0), z_dir=(0, 1, 0))):
        with Locations(Location((-100.957746479, 124, 0), (0, 0, 270))):
            Circle(SKETCH12_R)
        with Locations(Location((100.957746479, 124, 0), (0, 0, 90))):
            Circle(SKETCH12_R)
        with Locations(Location((-48, 132, 0), (0, 0, 270))):
            Circle(SKETCH12_R_2)
        with Locations(Location((-48, 100, 0), (0, 0, 270))):
            Circle(SKETCH12_R_2)
        with Locations(Location((-16, 132, 0), (0, 0, 270))):
            Circle(SKETCH12_R_2)
        with Locations(Location((-16, 100, 0), (0, 0, 270))):
            Circle(SKETCH12_R_2)
        with Locations(Location((-32, 118, 0), (0, 0, 270))):
            Circle(SKETCH12_R_2)
        with Locations(Location((0, 118, 0), (0, 0, 270))):
            Circle(SKETCH12_R_2)
        with Locations(Location((-64, 118, 0), (0, 0, 270))):
            Circle(SKETCH12_R_2)
        with Locations(Location((64, 118, 0), (0, 0, 90))):
            Circle(SKETCH12_R_2)
        with Locations(Location((48, 132, 0), (0, 0, 90))):
            Circle(SKETCH12_R_2)
        with Locations(Location((48, 100, 0), (0, 0, 90))):
            Circle(SKETCH12_R_2)
        with Locations(Location((32, 118, 0), (0, 0, 90))):
            Circle(SKETCH12_R_2)
        with Locations(Location((16, 132, 0), (0, 0, 90))):
            Circle(SKETCH12_R_2)
        with Locations(Location((16, 100, 0), (0, 0, 90))):
            Circle(SKETCH12_R_2)
    extrude(amount=-CUT_EXTRUDE6_DEPTH, mode=Mode.SUBTRACT)


solid = part.part
